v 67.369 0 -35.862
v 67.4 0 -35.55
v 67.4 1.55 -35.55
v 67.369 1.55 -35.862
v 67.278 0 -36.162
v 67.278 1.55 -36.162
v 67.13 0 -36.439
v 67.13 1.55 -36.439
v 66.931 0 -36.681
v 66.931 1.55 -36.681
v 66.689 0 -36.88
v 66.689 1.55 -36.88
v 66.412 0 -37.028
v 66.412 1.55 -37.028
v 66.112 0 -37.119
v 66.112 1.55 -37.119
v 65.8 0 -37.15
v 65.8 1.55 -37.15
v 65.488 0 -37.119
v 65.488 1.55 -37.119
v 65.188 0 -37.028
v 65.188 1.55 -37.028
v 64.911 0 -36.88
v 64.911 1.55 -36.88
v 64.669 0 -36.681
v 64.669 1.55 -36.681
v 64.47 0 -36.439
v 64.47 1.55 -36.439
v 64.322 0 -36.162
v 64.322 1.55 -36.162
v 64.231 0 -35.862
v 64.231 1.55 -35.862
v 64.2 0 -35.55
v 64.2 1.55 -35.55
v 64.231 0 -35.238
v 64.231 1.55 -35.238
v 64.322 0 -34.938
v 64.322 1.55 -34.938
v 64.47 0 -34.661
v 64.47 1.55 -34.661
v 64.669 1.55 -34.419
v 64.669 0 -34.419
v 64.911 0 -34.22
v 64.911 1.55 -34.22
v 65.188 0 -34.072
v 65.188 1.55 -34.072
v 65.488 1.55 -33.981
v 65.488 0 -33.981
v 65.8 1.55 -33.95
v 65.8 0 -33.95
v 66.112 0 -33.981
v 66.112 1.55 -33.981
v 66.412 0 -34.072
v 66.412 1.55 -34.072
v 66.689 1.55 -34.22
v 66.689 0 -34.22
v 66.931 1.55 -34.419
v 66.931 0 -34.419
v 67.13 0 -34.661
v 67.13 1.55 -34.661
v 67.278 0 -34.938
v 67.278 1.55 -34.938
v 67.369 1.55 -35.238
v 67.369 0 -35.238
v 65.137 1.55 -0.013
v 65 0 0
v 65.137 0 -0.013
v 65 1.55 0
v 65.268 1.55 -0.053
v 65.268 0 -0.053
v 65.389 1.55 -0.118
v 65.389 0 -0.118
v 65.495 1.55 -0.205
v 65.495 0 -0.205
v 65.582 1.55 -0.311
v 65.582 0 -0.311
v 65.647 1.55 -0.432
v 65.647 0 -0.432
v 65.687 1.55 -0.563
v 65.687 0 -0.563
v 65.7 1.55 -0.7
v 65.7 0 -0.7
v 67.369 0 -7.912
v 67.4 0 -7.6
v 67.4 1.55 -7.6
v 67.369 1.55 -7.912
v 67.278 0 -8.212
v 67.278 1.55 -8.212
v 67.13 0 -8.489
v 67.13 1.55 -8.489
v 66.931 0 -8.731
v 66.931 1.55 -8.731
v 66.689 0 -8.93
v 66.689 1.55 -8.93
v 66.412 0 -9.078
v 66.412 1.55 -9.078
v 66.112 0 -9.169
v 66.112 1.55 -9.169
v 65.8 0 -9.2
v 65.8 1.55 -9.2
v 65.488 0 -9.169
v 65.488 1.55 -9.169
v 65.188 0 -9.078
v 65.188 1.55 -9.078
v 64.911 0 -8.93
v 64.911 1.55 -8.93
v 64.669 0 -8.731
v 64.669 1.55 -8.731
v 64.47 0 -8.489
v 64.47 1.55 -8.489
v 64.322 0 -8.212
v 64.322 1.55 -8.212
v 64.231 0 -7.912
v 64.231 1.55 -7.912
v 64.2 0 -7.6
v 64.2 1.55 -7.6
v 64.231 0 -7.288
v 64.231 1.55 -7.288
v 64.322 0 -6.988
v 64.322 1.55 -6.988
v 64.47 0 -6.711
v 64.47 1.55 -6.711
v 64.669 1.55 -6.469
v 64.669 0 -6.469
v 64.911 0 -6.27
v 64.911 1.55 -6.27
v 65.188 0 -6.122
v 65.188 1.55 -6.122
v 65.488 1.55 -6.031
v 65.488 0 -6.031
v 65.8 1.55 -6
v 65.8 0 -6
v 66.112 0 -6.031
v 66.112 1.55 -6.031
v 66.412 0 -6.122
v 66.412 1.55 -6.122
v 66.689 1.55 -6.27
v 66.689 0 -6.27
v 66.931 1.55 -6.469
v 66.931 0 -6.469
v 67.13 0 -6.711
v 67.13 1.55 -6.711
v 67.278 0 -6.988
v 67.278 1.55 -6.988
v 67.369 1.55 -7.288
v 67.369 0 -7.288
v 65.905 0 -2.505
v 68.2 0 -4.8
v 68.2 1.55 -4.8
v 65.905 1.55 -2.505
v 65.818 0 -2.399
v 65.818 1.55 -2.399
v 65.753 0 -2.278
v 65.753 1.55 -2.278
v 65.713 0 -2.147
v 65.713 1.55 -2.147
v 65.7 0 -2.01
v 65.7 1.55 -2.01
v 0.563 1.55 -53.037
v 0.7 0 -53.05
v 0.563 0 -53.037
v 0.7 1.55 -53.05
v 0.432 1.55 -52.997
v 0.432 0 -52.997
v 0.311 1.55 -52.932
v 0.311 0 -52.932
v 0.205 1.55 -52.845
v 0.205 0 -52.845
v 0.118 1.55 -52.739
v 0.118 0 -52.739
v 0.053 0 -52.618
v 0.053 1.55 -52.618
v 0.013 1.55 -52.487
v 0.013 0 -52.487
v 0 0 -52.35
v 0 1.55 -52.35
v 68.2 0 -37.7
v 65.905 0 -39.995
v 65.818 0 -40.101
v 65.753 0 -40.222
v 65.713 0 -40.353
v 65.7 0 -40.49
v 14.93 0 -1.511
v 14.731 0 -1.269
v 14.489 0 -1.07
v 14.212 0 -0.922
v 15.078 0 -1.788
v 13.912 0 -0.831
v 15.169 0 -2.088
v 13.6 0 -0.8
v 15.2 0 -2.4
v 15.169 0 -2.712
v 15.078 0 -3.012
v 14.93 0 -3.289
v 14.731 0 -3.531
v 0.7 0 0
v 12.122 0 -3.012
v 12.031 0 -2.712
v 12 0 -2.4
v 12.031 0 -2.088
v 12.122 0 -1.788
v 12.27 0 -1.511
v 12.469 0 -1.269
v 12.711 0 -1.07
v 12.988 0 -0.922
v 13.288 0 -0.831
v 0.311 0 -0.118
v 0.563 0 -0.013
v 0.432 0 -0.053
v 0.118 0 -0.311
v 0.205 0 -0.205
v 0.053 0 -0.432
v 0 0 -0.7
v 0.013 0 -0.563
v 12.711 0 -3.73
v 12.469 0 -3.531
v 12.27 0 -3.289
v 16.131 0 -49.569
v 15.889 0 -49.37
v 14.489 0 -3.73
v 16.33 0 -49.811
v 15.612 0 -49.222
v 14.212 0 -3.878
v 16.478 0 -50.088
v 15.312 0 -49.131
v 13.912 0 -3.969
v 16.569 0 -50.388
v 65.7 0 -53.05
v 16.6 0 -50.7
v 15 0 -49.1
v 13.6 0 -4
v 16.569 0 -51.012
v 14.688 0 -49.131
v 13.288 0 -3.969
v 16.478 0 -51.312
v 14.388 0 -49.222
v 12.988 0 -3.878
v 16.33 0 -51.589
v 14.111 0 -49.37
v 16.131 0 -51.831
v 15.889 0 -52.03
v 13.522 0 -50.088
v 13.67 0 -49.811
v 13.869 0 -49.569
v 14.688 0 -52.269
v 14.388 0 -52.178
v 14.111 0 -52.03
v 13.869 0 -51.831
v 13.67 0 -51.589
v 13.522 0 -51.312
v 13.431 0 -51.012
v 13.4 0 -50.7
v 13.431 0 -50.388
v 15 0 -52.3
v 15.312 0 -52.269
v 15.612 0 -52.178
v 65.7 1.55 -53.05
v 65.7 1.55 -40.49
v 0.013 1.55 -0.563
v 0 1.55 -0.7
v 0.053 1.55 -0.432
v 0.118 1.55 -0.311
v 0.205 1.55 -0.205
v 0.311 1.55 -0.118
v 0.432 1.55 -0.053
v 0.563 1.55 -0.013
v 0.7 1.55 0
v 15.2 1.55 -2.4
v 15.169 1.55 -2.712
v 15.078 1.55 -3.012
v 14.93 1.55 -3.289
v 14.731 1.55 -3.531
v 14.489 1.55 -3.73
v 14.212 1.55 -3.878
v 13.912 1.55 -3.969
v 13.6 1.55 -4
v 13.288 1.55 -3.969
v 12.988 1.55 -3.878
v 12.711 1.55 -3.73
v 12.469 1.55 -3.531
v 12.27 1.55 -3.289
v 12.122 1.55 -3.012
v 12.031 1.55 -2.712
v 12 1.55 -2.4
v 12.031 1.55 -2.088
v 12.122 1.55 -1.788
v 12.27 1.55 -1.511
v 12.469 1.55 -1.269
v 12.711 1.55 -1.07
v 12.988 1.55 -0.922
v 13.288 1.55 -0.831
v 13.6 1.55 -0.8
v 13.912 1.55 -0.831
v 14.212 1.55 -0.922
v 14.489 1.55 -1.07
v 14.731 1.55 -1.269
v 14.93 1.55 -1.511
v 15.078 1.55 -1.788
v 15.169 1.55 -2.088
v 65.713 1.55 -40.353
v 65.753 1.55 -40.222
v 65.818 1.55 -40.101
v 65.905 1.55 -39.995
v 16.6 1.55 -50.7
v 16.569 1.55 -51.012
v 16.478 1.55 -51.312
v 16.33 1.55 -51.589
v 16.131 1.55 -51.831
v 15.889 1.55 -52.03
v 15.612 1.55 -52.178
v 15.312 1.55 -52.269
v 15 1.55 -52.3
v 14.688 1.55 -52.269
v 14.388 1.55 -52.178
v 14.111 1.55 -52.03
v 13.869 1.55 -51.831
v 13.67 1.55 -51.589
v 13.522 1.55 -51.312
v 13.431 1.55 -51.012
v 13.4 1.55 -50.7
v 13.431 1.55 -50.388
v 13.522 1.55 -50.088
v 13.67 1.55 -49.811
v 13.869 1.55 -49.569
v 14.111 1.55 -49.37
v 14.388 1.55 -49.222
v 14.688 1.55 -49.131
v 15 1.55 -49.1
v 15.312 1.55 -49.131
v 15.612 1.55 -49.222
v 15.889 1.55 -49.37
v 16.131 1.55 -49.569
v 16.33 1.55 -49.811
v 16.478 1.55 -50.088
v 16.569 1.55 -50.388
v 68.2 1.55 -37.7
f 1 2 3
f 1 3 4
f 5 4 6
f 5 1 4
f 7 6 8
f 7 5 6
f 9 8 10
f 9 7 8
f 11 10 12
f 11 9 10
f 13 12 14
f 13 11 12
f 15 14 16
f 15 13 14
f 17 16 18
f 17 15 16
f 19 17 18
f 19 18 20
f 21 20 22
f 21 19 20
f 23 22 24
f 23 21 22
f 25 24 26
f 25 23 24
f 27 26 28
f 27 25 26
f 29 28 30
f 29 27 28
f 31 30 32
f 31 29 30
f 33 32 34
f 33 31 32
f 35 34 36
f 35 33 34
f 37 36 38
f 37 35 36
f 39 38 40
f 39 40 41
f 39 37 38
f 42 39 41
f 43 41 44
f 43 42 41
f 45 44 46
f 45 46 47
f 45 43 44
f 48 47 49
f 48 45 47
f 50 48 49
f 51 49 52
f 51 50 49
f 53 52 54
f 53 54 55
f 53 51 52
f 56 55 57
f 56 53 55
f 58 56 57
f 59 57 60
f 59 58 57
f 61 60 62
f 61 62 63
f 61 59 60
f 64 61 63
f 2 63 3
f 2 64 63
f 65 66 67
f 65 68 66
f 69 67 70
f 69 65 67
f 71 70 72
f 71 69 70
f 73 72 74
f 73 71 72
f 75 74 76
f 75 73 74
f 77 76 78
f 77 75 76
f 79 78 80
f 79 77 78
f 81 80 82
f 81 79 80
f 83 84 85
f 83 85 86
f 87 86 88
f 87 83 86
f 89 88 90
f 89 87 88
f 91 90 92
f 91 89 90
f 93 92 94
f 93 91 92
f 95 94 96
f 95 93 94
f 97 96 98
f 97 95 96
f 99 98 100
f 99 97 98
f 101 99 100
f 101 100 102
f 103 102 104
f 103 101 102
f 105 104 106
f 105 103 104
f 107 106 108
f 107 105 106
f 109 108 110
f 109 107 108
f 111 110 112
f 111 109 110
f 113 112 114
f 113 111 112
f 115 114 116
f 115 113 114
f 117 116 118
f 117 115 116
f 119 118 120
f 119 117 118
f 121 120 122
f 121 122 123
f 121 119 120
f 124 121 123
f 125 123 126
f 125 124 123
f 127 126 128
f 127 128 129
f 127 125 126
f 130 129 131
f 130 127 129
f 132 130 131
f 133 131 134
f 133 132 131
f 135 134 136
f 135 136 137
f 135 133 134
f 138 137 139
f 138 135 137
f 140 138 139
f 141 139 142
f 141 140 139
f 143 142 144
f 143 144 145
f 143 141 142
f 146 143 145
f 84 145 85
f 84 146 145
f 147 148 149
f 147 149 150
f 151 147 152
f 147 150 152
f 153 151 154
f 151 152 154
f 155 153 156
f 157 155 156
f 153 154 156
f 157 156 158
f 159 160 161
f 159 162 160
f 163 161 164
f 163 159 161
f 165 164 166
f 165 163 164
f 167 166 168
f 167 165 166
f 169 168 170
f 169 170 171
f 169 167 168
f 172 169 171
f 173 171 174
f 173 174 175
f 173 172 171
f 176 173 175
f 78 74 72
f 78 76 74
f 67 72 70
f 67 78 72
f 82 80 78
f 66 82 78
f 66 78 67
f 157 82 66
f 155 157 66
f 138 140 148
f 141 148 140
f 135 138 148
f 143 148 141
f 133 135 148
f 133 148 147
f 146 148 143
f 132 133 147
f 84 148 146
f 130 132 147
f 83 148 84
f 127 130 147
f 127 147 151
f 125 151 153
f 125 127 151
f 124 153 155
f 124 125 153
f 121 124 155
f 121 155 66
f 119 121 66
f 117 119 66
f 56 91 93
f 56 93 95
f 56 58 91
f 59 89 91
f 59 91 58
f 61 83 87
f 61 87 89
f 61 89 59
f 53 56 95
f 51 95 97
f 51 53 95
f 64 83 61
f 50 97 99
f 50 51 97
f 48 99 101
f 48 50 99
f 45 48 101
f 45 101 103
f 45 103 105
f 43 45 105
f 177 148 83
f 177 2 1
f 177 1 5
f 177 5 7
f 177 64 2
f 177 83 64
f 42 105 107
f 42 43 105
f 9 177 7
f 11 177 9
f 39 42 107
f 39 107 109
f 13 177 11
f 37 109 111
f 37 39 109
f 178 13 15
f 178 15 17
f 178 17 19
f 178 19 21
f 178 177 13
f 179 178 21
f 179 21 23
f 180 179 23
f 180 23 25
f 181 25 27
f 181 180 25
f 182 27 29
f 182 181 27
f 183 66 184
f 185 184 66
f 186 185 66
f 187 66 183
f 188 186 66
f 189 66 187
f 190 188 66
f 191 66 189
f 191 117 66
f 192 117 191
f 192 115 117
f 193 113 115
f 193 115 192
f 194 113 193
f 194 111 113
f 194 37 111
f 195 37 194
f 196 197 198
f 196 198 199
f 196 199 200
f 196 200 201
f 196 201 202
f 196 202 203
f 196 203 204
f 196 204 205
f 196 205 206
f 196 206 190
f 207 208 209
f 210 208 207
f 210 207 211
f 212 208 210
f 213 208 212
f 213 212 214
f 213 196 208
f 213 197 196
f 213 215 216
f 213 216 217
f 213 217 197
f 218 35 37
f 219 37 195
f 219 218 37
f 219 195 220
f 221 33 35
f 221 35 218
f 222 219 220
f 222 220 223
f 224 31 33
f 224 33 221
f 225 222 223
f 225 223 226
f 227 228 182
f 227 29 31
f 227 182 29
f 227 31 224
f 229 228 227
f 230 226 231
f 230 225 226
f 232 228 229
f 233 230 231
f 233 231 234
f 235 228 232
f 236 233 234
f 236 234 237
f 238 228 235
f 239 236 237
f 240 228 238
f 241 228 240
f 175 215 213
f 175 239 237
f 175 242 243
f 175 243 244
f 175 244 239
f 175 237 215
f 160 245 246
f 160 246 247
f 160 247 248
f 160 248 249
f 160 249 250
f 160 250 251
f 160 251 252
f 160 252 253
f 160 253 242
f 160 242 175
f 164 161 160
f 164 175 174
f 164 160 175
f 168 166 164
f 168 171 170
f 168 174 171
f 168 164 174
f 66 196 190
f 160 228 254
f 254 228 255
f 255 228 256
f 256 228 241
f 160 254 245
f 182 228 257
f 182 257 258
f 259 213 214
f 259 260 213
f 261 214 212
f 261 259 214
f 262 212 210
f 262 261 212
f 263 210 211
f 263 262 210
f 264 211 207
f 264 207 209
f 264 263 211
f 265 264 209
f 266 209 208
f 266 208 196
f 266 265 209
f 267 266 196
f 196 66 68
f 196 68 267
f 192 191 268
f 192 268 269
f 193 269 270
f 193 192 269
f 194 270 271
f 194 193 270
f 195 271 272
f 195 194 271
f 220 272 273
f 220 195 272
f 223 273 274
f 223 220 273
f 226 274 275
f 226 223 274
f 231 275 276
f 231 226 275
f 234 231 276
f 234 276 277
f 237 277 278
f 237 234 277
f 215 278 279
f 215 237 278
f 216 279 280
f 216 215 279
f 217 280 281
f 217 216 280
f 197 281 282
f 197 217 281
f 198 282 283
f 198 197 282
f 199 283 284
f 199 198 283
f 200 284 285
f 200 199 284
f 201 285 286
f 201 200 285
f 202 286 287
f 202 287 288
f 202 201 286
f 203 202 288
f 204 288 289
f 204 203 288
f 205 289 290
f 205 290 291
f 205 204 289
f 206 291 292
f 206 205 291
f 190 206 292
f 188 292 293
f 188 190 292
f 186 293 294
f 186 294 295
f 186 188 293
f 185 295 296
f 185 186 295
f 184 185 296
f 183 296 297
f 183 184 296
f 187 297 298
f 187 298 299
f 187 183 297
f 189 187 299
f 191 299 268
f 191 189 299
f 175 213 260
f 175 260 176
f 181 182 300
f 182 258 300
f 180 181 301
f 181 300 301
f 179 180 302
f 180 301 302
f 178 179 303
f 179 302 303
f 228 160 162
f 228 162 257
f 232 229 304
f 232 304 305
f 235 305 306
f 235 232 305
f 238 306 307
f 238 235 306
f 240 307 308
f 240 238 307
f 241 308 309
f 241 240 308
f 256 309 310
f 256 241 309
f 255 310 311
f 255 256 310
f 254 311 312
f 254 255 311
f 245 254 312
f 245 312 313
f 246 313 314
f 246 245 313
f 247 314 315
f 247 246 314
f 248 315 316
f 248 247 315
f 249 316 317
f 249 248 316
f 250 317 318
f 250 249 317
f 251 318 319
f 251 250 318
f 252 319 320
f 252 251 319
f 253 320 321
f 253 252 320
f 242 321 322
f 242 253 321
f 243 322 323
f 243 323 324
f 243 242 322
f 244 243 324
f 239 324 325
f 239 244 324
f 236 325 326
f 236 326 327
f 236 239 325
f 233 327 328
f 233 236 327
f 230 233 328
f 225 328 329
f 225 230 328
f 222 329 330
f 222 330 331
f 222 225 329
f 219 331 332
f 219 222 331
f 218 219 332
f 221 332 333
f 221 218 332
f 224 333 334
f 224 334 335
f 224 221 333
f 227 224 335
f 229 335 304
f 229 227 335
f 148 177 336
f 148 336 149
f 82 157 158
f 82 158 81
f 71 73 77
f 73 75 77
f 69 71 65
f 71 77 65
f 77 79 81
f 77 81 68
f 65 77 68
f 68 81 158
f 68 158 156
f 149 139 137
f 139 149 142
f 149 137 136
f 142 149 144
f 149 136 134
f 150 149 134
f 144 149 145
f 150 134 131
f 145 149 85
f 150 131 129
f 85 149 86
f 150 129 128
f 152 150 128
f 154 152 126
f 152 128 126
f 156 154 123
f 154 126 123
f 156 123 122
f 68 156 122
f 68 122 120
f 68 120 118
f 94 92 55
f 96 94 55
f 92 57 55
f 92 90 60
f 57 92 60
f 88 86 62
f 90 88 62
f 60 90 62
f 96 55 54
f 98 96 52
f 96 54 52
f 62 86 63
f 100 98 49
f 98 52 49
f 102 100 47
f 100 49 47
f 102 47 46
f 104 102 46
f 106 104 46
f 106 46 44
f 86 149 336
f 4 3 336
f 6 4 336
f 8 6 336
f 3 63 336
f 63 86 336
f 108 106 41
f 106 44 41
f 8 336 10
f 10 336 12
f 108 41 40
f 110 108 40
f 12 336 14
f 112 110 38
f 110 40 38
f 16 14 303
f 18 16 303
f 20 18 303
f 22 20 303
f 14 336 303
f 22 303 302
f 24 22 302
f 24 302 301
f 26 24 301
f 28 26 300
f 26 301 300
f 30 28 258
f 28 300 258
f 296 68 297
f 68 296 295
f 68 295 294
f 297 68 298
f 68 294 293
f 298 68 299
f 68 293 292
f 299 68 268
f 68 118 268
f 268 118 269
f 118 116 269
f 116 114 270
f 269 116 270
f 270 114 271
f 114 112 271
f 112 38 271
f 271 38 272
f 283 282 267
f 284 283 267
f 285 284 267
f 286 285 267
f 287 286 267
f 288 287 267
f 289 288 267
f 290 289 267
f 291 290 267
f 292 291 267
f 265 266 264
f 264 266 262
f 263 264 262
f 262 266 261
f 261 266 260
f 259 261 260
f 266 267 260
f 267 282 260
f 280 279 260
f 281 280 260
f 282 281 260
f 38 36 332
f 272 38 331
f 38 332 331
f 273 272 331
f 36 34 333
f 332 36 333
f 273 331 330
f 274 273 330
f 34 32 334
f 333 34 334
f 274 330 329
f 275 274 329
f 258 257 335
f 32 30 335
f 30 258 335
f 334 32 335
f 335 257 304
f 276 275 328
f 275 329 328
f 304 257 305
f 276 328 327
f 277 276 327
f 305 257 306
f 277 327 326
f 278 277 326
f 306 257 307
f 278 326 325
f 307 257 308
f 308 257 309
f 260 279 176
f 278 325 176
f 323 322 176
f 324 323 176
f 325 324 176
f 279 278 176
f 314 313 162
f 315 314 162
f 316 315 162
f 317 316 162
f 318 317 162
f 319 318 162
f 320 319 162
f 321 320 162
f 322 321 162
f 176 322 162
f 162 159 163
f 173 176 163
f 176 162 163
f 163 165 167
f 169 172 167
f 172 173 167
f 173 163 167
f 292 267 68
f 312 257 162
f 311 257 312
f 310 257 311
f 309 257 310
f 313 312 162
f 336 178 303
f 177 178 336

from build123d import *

# Parameters (mm, degrees)
ESQUISSE1_R        = 1.6
BOSS_EXTRU_1_DEPTH = 1.55
CONG_1_R           = 0.7


with BuildPart() as part:
    # Esquisse1 → Boss.-Extru.1 (new body)
    with BuildSketch(Plane(origin=(0, 0, 0), x_dir=(1, 0, 0), z_dir=(0, 1, 0))):
        Polygon((65.7, 53.05), (65.7, 40.2), (68.2, 37.7), (68.2, 4.8), (65.7, 2.3), (65.7, 0), (0, 0), (0, 53.05), align=None)
        with Locations((15, 50.7)):
            Circle(ESQUISSE1_R, mode=Mode.SUBTRACT)
        with Locations((13.6, 2.4)):
            Circle(ESQUISSE1_R, mode=Mode.SUBTRACT)
        with Locations((65.8, 7.6)):
            Circle(ESQUISSE1_R, mode=Mode.SUBTRACT)
        with Locations((65.8, 35.55)):
            Circle(ESQUISSE1_R, mode=Mode.SUBTRACT)
    extrude(amount=BOSS_EXTRU_1_DEPTH)

    # Congé1
    cong_1_edges = [part.edges().sort_by_distance(p)[0] for p in [
        (0, 0.775, -53.05),
        (65.7, 0.775, -40.2),
        (65.7, 0.775, -2.3),
        (65.7, 0.775, 0),
        (0, 0.775, 0),
    ]]
    fillet(cong_1_edges, radius=CONG_1_R)


solid = part.part
